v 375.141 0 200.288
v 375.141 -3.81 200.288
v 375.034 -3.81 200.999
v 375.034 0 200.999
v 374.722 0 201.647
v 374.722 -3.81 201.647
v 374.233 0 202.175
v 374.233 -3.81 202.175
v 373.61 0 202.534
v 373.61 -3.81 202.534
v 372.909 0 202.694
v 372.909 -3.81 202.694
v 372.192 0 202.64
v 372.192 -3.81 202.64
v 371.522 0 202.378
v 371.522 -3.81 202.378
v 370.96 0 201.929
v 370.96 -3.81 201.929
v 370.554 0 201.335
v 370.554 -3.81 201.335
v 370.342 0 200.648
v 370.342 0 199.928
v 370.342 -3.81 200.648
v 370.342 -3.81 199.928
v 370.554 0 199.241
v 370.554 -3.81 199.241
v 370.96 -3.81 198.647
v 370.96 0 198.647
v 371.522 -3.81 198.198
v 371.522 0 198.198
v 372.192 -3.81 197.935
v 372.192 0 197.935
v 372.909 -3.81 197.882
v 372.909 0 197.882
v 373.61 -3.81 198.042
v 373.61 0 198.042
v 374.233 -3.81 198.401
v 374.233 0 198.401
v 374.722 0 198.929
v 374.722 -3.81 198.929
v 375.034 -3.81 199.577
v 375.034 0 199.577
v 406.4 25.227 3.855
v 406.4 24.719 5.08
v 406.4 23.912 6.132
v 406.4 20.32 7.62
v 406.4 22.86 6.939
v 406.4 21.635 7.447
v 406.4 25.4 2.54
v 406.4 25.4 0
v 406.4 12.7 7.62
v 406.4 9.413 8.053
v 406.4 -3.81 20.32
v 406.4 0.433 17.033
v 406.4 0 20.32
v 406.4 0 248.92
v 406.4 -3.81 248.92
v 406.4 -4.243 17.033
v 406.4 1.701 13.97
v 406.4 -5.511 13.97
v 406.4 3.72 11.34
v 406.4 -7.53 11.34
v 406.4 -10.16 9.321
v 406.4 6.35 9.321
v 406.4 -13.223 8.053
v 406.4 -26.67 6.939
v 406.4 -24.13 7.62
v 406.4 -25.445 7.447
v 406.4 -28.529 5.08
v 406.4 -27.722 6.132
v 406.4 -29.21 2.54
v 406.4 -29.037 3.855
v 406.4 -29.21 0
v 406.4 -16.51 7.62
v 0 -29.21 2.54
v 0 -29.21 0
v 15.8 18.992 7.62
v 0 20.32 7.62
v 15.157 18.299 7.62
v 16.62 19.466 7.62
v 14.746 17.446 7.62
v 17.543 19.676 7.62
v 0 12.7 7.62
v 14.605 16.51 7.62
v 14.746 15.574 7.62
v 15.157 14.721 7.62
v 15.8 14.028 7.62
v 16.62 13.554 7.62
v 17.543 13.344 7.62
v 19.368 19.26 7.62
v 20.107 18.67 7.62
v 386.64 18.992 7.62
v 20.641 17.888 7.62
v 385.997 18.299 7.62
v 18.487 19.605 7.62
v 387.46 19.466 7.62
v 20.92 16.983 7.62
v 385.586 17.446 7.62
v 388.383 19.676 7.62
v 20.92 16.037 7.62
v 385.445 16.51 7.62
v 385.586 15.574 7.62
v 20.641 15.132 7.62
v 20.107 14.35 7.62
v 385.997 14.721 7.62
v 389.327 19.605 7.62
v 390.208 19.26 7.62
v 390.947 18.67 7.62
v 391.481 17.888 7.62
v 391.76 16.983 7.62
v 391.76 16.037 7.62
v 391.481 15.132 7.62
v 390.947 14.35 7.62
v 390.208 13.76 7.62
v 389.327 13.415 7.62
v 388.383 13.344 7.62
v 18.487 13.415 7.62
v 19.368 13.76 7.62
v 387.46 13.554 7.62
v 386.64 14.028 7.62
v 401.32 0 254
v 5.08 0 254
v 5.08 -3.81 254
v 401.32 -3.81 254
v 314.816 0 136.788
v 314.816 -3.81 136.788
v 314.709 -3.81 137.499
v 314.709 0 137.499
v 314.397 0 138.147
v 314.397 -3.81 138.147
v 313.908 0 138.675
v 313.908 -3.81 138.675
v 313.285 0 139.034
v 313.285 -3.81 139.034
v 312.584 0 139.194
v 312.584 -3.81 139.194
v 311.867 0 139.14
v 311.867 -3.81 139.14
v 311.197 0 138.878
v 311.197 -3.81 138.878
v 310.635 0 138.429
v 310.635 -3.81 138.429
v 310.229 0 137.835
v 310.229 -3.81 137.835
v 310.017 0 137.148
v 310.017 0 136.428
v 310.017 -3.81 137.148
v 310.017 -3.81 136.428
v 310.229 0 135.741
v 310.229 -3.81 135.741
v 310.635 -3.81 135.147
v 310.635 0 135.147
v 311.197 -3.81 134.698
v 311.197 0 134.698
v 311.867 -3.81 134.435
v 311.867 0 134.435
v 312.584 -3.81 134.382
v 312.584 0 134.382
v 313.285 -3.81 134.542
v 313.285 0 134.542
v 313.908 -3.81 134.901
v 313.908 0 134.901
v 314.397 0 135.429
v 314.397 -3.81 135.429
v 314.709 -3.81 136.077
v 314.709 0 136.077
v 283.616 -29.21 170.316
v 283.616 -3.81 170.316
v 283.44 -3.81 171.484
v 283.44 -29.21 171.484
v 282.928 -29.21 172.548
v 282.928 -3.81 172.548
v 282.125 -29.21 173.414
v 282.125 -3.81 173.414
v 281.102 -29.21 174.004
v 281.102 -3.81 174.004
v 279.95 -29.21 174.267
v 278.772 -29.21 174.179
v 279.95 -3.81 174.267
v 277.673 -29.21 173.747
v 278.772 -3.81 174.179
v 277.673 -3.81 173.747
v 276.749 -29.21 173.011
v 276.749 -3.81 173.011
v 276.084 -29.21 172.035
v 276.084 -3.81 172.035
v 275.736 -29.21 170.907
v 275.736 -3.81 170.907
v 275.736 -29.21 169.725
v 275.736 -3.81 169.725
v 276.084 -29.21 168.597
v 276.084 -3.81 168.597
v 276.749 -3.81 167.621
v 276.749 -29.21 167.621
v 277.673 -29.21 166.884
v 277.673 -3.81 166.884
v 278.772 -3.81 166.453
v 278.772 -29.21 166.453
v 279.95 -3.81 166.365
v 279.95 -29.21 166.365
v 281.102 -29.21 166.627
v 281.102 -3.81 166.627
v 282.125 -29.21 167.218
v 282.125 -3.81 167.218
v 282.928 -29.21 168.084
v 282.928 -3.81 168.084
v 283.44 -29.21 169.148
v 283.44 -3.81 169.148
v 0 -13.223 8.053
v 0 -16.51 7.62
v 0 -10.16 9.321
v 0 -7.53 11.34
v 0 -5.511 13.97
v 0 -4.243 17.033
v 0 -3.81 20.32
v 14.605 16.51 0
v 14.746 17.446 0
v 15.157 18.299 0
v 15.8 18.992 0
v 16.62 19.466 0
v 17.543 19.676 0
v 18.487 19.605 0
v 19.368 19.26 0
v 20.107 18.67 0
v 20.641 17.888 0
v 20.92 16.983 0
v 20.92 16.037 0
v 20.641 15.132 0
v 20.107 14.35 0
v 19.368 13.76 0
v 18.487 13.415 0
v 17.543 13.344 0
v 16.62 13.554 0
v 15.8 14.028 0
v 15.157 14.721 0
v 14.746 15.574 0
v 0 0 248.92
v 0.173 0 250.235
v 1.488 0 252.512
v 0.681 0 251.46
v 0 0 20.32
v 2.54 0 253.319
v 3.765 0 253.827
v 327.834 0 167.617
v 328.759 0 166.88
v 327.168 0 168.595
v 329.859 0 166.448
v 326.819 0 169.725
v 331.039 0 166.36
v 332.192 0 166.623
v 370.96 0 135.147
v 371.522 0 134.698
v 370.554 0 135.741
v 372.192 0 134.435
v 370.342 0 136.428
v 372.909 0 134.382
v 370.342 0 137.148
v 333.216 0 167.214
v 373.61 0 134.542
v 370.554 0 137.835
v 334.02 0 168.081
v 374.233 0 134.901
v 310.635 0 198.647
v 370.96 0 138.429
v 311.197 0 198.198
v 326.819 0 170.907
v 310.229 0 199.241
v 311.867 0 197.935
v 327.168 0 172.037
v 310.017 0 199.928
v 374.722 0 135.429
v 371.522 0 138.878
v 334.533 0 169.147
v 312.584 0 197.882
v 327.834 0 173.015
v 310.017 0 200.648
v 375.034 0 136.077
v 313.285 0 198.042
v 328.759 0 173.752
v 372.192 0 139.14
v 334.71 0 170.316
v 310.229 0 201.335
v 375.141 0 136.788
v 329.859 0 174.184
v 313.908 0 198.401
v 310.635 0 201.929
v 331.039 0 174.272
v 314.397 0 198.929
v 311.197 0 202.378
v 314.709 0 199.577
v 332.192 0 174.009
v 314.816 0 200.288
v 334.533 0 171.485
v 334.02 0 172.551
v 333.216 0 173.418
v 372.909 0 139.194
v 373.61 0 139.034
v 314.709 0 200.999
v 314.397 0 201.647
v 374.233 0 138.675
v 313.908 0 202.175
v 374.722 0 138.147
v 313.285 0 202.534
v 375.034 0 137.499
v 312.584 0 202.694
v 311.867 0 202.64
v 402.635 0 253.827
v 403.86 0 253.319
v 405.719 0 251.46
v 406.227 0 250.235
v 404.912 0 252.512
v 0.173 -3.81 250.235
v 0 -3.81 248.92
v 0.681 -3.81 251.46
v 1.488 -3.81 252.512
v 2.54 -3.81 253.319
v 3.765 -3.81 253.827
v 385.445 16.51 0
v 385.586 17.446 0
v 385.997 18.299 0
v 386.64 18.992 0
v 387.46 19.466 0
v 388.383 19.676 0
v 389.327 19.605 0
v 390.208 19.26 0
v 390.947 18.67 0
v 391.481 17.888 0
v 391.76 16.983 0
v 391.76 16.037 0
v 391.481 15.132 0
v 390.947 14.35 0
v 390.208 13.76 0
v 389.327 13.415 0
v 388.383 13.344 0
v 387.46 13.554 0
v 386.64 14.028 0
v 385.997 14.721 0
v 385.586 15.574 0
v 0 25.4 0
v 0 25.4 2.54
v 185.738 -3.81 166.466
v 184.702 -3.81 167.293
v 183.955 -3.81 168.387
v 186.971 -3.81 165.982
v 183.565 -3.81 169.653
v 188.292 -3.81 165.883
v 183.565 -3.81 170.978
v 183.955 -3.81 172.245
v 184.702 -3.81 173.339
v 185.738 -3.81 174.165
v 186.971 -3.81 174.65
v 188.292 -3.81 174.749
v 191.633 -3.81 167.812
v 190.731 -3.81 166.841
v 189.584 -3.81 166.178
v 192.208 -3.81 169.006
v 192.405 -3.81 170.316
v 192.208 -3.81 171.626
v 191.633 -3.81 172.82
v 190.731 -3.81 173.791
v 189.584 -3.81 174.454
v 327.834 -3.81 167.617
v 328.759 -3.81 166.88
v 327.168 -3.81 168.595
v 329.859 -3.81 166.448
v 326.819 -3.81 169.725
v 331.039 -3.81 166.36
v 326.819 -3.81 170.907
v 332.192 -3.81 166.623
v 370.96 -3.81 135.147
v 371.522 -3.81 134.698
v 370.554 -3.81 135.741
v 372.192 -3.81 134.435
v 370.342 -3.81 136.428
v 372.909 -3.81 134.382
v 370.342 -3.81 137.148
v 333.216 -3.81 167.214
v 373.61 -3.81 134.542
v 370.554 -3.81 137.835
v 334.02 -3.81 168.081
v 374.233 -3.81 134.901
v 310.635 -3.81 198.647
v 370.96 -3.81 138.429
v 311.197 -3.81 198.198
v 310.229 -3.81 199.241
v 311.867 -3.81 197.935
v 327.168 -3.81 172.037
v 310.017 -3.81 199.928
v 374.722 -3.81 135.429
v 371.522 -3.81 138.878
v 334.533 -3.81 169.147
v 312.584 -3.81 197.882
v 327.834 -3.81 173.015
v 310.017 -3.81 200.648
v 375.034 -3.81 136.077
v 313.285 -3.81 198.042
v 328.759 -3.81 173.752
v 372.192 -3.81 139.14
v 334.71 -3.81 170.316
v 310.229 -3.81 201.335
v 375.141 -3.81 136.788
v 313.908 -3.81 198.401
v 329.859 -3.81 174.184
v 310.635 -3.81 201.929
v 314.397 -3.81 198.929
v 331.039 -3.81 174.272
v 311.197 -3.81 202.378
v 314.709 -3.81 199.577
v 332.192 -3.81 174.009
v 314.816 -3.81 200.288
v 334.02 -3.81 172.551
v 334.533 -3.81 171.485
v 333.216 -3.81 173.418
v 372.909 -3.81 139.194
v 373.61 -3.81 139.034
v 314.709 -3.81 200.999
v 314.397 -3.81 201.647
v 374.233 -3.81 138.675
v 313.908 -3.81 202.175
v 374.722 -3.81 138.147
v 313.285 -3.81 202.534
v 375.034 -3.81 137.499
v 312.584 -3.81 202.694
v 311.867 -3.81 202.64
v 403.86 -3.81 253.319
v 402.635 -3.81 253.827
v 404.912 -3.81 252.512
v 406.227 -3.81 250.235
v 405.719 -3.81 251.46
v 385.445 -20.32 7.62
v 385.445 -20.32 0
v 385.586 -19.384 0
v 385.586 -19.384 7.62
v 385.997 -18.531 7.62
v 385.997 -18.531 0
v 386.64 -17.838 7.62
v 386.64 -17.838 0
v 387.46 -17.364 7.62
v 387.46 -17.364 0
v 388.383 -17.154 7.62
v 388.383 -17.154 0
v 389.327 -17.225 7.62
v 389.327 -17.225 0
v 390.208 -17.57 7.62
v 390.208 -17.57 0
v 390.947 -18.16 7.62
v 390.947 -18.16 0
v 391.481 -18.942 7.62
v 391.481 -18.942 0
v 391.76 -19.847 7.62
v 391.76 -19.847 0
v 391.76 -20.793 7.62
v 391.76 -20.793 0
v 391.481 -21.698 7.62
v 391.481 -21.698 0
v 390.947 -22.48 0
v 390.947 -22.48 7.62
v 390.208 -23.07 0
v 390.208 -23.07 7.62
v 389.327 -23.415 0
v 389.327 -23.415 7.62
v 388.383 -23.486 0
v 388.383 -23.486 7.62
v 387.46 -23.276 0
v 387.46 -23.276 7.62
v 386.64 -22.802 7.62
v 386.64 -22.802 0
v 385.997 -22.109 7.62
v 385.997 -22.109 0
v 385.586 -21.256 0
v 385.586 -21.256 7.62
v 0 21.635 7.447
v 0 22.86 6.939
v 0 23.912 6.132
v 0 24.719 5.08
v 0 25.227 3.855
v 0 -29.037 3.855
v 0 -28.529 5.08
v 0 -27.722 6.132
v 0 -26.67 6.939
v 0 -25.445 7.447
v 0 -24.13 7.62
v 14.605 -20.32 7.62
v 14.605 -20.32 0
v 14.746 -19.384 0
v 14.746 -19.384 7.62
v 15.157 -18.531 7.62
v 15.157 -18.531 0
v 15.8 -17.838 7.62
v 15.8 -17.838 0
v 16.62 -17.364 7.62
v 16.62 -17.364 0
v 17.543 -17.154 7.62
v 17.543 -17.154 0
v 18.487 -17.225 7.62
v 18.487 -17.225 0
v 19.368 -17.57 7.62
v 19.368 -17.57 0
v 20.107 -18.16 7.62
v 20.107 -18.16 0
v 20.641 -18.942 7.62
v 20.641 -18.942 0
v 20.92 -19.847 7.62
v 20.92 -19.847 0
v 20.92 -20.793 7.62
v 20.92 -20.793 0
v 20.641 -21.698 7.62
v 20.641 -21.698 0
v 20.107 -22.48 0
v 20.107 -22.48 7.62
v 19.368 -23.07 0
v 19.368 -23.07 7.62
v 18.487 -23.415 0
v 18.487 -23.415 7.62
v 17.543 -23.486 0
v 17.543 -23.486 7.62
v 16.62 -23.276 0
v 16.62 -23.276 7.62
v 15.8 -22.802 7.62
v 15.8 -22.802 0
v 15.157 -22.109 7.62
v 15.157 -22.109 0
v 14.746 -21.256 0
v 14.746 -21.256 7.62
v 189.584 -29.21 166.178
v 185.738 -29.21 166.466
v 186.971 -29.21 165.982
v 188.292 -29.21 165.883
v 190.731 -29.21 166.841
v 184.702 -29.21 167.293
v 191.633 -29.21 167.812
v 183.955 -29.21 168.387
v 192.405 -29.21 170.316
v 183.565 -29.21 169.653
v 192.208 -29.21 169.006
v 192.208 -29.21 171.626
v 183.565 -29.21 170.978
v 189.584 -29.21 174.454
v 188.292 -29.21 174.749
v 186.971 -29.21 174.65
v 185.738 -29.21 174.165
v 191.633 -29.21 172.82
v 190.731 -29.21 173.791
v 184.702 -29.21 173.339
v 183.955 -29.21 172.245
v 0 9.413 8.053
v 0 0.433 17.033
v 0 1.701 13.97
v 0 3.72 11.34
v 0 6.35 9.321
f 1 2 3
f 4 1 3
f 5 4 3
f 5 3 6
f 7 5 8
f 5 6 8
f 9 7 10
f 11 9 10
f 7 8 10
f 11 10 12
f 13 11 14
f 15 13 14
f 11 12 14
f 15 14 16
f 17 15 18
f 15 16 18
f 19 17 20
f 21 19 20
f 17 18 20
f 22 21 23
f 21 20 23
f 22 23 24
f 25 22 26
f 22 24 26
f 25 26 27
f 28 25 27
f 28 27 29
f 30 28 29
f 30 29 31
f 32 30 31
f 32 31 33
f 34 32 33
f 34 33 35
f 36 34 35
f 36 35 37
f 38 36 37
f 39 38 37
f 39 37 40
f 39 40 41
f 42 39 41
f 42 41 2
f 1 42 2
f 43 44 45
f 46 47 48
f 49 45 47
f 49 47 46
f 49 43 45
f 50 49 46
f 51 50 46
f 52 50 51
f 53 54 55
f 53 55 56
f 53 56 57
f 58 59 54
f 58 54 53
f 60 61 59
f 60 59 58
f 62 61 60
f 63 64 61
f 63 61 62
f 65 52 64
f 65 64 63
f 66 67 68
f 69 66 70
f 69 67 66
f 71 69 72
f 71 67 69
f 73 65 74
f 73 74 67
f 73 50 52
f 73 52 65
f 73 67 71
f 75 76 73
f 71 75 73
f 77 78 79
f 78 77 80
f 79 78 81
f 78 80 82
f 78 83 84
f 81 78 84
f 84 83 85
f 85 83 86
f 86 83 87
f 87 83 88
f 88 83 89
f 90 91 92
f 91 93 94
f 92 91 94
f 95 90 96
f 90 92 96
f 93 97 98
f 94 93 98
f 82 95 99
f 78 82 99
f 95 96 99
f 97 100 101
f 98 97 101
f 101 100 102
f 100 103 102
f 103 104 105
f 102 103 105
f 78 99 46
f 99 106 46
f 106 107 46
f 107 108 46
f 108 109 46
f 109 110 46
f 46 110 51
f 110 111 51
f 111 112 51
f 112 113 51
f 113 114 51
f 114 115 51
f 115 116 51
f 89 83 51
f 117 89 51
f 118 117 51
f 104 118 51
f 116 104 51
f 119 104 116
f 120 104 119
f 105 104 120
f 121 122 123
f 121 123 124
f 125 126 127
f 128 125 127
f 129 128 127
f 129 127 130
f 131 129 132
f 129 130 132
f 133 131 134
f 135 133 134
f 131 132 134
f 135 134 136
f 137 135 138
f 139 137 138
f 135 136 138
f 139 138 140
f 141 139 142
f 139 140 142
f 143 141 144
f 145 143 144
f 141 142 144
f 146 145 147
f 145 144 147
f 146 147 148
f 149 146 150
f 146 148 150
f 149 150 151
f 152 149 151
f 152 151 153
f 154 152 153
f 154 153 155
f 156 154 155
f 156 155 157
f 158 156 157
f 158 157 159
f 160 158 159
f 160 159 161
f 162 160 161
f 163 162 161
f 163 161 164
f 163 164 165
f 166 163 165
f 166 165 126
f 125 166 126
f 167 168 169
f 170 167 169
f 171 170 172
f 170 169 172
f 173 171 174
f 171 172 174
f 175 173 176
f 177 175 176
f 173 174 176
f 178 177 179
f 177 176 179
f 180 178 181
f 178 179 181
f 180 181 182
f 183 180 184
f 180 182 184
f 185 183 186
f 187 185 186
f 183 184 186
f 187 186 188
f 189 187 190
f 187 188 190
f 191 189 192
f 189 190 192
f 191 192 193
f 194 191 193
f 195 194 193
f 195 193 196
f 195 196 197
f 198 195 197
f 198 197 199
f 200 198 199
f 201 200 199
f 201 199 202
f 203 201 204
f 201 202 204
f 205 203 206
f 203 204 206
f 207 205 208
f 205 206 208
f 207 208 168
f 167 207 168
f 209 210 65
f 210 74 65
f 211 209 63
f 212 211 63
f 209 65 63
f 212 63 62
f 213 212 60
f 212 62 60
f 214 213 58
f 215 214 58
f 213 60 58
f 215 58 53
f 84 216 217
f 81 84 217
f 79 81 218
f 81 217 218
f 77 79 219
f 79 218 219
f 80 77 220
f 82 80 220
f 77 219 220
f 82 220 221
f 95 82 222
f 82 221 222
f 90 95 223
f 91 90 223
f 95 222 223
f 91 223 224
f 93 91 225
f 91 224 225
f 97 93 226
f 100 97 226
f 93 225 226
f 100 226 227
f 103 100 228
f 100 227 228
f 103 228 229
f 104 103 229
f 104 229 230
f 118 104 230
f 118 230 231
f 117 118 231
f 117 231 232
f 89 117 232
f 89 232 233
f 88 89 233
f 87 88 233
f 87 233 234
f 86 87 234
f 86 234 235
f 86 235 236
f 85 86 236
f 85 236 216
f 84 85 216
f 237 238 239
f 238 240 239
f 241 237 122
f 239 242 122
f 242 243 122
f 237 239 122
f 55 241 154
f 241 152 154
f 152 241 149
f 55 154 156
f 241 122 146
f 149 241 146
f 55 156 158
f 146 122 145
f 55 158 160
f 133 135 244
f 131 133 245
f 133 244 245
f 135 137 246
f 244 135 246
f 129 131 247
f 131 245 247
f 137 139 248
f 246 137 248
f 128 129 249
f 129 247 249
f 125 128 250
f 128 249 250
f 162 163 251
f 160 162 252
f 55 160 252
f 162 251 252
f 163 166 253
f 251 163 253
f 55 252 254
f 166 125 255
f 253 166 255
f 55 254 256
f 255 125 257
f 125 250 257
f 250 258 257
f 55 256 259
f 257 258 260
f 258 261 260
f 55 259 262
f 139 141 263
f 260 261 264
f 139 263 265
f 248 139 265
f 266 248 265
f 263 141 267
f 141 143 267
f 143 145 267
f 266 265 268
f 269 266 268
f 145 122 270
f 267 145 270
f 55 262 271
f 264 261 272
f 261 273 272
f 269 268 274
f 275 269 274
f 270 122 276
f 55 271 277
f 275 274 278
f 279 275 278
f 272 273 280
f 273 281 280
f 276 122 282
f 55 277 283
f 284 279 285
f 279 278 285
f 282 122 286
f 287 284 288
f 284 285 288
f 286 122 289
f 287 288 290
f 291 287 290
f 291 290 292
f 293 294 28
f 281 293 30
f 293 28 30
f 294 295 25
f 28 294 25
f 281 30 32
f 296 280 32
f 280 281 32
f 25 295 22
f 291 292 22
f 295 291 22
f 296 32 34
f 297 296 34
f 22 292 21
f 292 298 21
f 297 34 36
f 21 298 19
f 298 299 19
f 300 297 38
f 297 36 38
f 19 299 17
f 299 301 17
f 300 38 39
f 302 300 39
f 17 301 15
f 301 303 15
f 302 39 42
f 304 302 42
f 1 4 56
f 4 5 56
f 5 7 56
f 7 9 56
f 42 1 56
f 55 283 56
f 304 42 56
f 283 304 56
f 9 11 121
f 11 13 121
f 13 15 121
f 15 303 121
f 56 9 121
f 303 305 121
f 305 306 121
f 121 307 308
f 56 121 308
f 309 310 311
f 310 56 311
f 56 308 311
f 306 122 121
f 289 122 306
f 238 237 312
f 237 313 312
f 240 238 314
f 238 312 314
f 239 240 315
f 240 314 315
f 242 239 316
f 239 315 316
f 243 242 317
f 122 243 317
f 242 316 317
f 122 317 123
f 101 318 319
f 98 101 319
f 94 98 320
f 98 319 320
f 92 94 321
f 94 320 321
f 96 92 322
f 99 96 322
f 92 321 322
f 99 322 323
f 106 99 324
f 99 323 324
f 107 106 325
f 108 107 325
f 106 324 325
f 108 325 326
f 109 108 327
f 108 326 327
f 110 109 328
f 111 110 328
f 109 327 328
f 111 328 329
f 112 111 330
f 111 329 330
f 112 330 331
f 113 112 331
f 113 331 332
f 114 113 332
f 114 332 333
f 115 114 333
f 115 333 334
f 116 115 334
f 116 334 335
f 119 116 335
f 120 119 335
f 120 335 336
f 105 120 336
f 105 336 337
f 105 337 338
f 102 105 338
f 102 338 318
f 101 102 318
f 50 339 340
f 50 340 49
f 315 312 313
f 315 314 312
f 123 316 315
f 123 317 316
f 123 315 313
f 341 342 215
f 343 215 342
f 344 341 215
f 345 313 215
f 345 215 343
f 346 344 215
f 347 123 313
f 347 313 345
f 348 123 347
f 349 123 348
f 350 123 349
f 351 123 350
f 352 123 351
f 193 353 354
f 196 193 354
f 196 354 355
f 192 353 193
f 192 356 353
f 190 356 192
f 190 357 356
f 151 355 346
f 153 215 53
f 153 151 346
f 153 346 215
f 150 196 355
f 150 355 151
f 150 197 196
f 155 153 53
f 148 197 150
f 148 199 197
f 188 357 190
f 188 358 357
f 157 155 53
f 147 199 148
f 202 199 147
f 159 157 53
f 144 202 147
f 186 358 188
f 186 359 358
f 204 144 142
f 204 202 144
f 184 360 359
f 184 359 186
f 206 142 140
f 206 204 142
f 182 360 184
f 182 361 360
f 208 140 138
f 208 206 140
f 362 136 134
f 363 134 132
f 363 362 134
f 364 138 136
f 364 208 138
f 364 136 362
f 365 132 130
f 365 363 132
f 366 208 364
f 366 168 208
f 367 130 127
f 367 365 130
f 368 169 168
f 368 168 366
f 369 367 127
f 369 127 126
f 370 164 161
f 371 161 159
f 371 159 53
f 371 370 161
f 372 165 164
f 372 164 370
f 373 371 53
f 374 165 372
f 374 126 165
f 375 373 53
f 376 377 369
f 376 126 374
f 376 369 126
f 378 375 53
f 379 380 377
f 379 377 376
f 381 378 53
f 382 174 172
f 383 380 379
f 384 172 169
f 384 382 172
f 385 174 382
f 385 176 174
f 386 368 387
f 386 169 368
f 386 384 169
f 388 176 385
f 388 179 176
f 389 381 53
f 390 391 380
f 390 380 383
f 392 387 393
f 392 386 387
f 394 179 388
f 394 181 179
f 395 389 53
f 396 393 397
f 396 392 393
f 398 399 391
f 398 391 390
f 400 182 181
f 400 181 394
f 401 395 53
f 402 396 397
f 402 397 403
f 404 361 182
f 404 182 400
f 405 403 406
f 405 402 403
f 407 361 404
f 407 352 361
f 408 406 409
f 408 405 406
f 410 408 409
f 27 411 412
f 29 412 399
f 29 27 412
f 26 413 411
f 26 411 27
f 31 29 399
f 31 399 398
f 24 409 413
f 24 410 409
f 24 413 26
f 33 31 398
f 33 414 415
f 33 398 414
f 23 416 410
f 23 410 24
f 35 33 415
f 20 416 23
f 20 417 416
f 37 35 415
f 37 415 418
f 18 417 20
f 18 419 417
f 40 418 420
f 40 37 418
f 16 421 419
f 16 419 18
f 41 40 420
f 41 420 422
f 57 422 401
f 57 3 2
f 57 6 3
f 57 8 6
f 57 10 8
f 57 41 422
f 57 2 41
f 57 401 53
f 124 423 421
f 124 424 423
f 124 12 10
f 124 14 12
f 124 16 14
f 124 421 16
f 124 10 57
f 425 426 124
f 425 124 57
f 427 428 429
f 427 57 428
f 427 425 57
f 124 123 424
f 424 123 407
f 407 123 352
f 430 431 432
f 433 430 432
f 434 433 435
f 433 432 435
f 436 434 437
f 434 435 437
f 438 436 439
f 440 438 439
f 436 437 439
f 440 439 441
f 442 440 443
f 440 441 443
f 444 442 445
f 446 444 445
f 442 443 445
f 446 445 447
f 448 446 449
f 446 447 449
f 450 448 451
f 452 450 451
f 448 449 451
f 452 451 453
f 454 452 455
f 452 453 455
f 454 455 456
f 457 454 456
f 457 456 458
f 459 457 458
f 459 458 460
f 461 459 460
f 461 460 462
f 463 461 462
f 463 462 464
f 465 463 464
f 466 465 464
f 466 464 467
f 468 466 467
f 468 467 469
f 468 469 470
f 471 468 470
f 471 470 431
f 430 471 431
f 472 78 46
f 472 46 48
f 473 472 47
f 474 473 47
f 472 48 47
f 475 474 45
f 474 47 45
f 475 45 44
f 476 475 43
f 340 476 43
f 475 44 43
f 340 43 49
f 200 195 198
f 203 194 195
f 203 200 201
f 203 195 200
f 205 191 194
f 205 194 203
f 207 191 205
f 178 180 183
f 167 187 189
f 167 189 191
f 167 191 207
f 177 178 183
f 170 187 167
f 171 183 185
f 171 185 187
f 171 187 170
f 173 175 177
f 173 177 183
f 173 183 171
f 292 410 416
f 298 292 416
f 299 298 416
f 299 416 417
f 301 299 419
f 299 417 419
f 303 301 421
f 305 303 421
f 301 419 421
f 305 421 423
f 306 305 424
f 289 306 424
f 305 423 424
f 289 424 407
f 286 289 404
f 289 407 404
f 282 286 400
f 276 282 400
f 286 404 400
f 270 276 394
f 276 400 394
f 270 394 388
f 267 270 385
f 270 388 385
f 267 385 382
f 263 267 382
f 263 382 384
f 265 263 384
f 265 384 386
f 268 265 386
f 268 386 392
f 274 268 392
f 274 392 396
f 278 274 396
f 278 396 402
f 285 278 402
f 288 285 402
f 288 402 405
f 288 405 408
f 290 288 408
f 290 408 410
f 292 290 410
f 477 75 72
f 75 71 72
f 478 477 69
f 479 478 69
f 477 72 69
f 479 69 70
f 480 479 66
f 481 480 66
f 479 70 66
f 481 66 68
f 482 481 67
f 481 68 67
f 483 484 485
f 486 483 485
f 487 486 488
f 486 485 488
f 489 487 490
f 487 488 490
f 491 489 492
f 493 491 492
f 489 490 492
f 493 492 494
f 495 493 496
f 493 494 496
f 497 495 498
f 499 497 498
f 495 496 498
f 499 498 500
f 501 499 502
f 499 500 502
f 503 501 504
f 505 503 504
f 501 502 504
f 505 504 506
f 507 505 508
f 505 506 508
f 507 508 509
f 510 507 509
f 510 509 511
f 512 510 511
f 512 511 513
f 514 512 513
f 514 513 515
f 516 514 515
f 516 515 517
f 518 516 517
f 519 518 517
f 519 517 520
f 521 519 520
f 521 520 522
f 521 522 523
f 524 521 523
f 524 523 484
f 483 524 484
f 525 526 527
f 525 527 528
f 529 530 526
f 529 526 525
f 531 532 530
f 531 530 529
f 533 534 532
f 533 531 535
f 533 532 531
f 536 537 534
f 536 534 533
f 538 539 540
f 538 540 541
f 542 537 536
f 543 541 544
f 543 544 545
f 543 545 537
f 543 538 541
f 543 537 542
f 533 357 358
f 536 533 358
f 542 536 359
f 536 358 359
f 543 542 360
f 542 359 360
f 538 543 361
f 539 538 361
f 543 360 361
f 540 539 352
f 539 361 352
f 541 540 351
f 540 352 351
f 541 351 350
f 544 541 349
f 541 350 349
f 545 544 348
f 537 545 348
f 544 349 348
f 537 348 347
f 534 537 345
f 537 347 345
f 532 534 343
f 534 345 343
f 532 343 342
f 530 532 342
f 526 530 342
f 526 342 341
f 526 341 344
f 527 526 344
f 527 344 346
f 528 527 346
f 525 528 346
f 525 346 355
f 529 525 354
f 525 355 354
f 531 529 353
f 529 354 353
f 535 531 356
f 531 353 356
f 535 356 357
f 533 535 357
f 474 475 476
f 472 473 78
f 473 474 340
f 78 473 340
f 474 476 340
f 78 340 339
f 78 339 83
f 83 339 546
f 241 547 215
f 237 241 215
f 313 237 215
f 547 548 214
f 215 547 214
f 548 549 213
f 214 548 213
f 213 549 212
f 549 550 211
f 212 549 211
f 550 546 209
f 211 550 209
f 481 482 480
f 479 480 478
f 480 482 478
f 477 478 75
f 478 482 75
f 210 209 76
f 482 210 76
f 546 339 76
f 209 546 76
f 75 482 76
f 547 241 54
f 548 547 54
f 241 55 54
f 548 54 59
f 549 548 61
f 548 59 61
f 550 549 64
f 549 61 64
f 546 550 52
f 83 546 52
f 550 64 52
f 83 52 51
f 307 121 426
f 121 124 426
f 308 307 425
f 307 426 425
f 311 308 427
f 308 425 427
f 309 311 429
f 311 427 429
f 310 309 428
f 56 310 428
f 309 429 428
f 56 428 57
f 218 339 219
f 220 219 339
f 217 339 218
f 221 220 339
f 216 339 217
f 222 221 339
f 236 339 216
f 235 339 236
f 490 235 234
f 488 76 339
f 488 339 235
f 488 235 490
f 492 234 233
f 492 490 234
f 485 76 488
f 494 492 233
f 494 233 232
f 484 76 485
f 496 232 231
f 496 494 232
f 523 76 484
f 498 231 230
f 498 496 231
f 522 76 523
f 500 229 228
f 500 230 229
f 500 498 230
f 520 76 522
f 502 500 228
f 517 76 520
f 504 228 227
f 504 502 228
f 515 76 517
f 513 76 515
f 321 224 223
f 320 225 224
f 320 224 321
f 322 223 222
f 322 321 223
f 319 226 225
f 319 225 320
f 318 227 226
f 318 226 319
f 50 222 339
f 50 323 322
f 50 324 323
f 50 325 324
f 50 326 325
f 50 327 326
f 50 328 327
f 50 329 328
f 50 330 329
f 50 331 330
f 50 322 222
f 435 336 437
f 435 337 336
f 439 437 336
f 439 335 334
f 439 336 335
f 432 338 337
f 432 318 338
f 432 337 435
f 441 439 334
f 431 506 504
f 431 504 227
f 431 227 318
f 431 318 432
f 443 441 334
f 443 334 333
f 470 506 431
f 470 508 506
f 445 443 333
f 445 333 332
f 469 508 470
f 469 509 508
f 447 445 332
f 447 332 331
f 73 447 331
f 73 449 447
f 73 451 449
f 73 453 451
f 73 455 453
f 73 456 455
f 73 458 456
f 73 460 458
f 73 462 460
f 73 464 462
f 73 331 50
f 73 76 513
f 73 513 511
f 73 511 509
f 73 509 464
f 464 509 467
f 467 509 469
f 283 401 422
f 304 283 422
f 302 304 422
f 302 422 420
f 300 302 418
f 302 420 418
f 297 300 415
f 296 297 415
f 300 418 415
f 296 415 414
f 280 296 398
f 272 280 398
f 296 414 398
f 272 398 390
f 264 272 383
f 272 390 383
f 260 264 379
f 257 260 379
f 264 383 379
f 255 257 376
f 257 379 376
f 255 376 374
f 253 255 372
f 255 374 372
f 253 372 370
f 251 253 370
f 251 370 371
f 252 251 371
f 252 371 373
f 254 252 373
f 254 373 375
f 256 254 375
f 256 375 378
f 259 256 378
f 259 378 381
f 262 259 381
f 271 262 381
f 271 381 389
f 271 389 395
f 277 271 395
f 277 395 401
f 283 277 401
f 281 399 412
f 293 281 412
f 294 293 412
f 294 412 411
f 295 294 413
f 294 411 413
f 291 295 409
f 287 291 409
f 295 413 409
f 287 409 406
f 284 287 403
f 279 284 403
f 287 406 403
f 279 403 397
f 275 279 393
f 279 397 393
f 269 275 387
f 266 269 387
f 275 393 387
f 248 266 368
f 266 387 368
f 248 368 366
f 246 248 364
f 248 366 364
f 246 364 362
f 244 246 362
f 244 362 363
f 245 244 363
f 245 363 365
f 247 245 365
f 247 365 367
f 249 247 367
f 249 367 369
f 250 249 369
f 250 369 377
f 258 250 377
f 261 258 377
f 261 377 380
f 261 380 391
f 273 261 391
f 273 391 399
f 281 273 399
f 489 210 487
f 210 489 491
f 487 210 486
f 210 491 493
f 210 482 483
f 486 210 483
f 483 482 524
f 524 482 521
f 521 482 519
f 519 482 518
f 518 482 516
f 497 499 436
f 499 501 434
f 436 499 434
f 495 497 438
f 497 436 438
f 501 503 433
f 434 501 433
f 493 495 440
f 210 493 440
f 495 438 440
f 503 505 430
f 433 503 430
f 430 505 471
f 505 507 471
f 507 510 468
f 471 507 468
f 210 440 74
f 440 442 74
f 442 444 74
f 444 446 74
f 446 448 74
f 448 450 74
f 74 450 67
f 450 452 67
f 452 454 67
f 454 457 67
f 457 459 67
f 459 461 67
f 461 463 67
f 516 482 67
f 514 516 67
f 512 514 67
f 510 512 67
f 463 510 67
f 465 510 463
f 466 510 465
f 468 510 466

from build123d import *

# Parameters (mm, degrees)
F0_W      = 406.4
F0_H      = 254
F1_DEPTH  = 3.81
F2_W      = 406.4
F2_H      = 54.61
F3_DEPTH  = 7.62
F4_R      = 12.7
F5_R      = 5.08
F6_R      = 2.413
F6_R_2    = 3.96748
F7_DEPTH  = 29.211
F8_R      = 3.9624
F9_DEPTH  = 25.4
F10_R     = 4.445
F11_DEPTH = 25.4
F13_D     = 6.35


with BuildPart() as f1:
    # F0 (on Front) → F1 (new body)
    with BuildSketch(Plane.XZ):
        with Locations((203.2, 127)):
            Rectangle(F0_W, F0_H)
    extrude(amount=F1_DEPTH)

    # F2 (on face) → F3 (join)
    with BuildSketch(Plane(origin=(0, 0, 0), x_dir=(1, 0, 0), z_dir=(0, 0, -1))):
        with Locations((203.2, 1.905)):
            Rectangle(F2_W, F2_H)
    extrude(amount=-F3_DEPTH)

    # F4
    f4_edges = [f1.edges().sort_by_distance(p)[0] for p in [
        (203.2, 0, 7.62),
        (203.2, -3.81, 7.62),
    ]]
    fillet(f4_edges, radius=F4_R)

    # F5
    f5_edges = [f1.edges().sort_by_distance(p)[0] for p in [
        (203.2, -29.21, 7.62),
        (203.2, 25.4, 7.62),
        (406.4, -1.905, 254),
        (0, -1.905, 254),
    ]]
    fillet(f5_edges, radius=F5_R)

    # F6 (on face) → F7 (cut, through all)
    with BuildSketch(Plane.XZ.offset(3.81)):
        with Locations((312.4034767258, 200.2879581752)):
            Circle(F6_R)
        with Locations((372.7284767258, 200.2879581752)):
            Circle(F6_R)
        with Locations((312.4034767258, 136.7879581752)):
            Circle(F6_R)
        with Locations((372.7284767258, 136.7879581752)):
            Circle(F6_R)
        with Locations((330.7422767258, 170.3159581752)):
            Circle(F6_R_2)
    extrude(amount=-F7_DEPTH, mode=Mode.SUBTRACT)

    # F8 (on face) → F9 (join)
    with BuildSketch(Plane.XZ.offset(3.81)):
        with Locations((279.654, 170.3159581752)):
            Circle(F8_R)
    extrude(amount=F9_DEPTH)

    # F10 (on face) → F11 (join)
    with BuildSketch(Plane.XZ.offset(3.81)):
        with Locations((187.96, 170.3159581752)):
            Circle(F10_R)
    extrude(amount=F11_DEPTH)

    # F13 (through all)
    with Locations(Plane.XY.offset(7.62)):
        with Locations((388.62, 16.51), (388.62, -20.32), (17.78, 16.51), (17.78, -20.32)):
            Hole(F13_D / 2)


solid = f1.part
